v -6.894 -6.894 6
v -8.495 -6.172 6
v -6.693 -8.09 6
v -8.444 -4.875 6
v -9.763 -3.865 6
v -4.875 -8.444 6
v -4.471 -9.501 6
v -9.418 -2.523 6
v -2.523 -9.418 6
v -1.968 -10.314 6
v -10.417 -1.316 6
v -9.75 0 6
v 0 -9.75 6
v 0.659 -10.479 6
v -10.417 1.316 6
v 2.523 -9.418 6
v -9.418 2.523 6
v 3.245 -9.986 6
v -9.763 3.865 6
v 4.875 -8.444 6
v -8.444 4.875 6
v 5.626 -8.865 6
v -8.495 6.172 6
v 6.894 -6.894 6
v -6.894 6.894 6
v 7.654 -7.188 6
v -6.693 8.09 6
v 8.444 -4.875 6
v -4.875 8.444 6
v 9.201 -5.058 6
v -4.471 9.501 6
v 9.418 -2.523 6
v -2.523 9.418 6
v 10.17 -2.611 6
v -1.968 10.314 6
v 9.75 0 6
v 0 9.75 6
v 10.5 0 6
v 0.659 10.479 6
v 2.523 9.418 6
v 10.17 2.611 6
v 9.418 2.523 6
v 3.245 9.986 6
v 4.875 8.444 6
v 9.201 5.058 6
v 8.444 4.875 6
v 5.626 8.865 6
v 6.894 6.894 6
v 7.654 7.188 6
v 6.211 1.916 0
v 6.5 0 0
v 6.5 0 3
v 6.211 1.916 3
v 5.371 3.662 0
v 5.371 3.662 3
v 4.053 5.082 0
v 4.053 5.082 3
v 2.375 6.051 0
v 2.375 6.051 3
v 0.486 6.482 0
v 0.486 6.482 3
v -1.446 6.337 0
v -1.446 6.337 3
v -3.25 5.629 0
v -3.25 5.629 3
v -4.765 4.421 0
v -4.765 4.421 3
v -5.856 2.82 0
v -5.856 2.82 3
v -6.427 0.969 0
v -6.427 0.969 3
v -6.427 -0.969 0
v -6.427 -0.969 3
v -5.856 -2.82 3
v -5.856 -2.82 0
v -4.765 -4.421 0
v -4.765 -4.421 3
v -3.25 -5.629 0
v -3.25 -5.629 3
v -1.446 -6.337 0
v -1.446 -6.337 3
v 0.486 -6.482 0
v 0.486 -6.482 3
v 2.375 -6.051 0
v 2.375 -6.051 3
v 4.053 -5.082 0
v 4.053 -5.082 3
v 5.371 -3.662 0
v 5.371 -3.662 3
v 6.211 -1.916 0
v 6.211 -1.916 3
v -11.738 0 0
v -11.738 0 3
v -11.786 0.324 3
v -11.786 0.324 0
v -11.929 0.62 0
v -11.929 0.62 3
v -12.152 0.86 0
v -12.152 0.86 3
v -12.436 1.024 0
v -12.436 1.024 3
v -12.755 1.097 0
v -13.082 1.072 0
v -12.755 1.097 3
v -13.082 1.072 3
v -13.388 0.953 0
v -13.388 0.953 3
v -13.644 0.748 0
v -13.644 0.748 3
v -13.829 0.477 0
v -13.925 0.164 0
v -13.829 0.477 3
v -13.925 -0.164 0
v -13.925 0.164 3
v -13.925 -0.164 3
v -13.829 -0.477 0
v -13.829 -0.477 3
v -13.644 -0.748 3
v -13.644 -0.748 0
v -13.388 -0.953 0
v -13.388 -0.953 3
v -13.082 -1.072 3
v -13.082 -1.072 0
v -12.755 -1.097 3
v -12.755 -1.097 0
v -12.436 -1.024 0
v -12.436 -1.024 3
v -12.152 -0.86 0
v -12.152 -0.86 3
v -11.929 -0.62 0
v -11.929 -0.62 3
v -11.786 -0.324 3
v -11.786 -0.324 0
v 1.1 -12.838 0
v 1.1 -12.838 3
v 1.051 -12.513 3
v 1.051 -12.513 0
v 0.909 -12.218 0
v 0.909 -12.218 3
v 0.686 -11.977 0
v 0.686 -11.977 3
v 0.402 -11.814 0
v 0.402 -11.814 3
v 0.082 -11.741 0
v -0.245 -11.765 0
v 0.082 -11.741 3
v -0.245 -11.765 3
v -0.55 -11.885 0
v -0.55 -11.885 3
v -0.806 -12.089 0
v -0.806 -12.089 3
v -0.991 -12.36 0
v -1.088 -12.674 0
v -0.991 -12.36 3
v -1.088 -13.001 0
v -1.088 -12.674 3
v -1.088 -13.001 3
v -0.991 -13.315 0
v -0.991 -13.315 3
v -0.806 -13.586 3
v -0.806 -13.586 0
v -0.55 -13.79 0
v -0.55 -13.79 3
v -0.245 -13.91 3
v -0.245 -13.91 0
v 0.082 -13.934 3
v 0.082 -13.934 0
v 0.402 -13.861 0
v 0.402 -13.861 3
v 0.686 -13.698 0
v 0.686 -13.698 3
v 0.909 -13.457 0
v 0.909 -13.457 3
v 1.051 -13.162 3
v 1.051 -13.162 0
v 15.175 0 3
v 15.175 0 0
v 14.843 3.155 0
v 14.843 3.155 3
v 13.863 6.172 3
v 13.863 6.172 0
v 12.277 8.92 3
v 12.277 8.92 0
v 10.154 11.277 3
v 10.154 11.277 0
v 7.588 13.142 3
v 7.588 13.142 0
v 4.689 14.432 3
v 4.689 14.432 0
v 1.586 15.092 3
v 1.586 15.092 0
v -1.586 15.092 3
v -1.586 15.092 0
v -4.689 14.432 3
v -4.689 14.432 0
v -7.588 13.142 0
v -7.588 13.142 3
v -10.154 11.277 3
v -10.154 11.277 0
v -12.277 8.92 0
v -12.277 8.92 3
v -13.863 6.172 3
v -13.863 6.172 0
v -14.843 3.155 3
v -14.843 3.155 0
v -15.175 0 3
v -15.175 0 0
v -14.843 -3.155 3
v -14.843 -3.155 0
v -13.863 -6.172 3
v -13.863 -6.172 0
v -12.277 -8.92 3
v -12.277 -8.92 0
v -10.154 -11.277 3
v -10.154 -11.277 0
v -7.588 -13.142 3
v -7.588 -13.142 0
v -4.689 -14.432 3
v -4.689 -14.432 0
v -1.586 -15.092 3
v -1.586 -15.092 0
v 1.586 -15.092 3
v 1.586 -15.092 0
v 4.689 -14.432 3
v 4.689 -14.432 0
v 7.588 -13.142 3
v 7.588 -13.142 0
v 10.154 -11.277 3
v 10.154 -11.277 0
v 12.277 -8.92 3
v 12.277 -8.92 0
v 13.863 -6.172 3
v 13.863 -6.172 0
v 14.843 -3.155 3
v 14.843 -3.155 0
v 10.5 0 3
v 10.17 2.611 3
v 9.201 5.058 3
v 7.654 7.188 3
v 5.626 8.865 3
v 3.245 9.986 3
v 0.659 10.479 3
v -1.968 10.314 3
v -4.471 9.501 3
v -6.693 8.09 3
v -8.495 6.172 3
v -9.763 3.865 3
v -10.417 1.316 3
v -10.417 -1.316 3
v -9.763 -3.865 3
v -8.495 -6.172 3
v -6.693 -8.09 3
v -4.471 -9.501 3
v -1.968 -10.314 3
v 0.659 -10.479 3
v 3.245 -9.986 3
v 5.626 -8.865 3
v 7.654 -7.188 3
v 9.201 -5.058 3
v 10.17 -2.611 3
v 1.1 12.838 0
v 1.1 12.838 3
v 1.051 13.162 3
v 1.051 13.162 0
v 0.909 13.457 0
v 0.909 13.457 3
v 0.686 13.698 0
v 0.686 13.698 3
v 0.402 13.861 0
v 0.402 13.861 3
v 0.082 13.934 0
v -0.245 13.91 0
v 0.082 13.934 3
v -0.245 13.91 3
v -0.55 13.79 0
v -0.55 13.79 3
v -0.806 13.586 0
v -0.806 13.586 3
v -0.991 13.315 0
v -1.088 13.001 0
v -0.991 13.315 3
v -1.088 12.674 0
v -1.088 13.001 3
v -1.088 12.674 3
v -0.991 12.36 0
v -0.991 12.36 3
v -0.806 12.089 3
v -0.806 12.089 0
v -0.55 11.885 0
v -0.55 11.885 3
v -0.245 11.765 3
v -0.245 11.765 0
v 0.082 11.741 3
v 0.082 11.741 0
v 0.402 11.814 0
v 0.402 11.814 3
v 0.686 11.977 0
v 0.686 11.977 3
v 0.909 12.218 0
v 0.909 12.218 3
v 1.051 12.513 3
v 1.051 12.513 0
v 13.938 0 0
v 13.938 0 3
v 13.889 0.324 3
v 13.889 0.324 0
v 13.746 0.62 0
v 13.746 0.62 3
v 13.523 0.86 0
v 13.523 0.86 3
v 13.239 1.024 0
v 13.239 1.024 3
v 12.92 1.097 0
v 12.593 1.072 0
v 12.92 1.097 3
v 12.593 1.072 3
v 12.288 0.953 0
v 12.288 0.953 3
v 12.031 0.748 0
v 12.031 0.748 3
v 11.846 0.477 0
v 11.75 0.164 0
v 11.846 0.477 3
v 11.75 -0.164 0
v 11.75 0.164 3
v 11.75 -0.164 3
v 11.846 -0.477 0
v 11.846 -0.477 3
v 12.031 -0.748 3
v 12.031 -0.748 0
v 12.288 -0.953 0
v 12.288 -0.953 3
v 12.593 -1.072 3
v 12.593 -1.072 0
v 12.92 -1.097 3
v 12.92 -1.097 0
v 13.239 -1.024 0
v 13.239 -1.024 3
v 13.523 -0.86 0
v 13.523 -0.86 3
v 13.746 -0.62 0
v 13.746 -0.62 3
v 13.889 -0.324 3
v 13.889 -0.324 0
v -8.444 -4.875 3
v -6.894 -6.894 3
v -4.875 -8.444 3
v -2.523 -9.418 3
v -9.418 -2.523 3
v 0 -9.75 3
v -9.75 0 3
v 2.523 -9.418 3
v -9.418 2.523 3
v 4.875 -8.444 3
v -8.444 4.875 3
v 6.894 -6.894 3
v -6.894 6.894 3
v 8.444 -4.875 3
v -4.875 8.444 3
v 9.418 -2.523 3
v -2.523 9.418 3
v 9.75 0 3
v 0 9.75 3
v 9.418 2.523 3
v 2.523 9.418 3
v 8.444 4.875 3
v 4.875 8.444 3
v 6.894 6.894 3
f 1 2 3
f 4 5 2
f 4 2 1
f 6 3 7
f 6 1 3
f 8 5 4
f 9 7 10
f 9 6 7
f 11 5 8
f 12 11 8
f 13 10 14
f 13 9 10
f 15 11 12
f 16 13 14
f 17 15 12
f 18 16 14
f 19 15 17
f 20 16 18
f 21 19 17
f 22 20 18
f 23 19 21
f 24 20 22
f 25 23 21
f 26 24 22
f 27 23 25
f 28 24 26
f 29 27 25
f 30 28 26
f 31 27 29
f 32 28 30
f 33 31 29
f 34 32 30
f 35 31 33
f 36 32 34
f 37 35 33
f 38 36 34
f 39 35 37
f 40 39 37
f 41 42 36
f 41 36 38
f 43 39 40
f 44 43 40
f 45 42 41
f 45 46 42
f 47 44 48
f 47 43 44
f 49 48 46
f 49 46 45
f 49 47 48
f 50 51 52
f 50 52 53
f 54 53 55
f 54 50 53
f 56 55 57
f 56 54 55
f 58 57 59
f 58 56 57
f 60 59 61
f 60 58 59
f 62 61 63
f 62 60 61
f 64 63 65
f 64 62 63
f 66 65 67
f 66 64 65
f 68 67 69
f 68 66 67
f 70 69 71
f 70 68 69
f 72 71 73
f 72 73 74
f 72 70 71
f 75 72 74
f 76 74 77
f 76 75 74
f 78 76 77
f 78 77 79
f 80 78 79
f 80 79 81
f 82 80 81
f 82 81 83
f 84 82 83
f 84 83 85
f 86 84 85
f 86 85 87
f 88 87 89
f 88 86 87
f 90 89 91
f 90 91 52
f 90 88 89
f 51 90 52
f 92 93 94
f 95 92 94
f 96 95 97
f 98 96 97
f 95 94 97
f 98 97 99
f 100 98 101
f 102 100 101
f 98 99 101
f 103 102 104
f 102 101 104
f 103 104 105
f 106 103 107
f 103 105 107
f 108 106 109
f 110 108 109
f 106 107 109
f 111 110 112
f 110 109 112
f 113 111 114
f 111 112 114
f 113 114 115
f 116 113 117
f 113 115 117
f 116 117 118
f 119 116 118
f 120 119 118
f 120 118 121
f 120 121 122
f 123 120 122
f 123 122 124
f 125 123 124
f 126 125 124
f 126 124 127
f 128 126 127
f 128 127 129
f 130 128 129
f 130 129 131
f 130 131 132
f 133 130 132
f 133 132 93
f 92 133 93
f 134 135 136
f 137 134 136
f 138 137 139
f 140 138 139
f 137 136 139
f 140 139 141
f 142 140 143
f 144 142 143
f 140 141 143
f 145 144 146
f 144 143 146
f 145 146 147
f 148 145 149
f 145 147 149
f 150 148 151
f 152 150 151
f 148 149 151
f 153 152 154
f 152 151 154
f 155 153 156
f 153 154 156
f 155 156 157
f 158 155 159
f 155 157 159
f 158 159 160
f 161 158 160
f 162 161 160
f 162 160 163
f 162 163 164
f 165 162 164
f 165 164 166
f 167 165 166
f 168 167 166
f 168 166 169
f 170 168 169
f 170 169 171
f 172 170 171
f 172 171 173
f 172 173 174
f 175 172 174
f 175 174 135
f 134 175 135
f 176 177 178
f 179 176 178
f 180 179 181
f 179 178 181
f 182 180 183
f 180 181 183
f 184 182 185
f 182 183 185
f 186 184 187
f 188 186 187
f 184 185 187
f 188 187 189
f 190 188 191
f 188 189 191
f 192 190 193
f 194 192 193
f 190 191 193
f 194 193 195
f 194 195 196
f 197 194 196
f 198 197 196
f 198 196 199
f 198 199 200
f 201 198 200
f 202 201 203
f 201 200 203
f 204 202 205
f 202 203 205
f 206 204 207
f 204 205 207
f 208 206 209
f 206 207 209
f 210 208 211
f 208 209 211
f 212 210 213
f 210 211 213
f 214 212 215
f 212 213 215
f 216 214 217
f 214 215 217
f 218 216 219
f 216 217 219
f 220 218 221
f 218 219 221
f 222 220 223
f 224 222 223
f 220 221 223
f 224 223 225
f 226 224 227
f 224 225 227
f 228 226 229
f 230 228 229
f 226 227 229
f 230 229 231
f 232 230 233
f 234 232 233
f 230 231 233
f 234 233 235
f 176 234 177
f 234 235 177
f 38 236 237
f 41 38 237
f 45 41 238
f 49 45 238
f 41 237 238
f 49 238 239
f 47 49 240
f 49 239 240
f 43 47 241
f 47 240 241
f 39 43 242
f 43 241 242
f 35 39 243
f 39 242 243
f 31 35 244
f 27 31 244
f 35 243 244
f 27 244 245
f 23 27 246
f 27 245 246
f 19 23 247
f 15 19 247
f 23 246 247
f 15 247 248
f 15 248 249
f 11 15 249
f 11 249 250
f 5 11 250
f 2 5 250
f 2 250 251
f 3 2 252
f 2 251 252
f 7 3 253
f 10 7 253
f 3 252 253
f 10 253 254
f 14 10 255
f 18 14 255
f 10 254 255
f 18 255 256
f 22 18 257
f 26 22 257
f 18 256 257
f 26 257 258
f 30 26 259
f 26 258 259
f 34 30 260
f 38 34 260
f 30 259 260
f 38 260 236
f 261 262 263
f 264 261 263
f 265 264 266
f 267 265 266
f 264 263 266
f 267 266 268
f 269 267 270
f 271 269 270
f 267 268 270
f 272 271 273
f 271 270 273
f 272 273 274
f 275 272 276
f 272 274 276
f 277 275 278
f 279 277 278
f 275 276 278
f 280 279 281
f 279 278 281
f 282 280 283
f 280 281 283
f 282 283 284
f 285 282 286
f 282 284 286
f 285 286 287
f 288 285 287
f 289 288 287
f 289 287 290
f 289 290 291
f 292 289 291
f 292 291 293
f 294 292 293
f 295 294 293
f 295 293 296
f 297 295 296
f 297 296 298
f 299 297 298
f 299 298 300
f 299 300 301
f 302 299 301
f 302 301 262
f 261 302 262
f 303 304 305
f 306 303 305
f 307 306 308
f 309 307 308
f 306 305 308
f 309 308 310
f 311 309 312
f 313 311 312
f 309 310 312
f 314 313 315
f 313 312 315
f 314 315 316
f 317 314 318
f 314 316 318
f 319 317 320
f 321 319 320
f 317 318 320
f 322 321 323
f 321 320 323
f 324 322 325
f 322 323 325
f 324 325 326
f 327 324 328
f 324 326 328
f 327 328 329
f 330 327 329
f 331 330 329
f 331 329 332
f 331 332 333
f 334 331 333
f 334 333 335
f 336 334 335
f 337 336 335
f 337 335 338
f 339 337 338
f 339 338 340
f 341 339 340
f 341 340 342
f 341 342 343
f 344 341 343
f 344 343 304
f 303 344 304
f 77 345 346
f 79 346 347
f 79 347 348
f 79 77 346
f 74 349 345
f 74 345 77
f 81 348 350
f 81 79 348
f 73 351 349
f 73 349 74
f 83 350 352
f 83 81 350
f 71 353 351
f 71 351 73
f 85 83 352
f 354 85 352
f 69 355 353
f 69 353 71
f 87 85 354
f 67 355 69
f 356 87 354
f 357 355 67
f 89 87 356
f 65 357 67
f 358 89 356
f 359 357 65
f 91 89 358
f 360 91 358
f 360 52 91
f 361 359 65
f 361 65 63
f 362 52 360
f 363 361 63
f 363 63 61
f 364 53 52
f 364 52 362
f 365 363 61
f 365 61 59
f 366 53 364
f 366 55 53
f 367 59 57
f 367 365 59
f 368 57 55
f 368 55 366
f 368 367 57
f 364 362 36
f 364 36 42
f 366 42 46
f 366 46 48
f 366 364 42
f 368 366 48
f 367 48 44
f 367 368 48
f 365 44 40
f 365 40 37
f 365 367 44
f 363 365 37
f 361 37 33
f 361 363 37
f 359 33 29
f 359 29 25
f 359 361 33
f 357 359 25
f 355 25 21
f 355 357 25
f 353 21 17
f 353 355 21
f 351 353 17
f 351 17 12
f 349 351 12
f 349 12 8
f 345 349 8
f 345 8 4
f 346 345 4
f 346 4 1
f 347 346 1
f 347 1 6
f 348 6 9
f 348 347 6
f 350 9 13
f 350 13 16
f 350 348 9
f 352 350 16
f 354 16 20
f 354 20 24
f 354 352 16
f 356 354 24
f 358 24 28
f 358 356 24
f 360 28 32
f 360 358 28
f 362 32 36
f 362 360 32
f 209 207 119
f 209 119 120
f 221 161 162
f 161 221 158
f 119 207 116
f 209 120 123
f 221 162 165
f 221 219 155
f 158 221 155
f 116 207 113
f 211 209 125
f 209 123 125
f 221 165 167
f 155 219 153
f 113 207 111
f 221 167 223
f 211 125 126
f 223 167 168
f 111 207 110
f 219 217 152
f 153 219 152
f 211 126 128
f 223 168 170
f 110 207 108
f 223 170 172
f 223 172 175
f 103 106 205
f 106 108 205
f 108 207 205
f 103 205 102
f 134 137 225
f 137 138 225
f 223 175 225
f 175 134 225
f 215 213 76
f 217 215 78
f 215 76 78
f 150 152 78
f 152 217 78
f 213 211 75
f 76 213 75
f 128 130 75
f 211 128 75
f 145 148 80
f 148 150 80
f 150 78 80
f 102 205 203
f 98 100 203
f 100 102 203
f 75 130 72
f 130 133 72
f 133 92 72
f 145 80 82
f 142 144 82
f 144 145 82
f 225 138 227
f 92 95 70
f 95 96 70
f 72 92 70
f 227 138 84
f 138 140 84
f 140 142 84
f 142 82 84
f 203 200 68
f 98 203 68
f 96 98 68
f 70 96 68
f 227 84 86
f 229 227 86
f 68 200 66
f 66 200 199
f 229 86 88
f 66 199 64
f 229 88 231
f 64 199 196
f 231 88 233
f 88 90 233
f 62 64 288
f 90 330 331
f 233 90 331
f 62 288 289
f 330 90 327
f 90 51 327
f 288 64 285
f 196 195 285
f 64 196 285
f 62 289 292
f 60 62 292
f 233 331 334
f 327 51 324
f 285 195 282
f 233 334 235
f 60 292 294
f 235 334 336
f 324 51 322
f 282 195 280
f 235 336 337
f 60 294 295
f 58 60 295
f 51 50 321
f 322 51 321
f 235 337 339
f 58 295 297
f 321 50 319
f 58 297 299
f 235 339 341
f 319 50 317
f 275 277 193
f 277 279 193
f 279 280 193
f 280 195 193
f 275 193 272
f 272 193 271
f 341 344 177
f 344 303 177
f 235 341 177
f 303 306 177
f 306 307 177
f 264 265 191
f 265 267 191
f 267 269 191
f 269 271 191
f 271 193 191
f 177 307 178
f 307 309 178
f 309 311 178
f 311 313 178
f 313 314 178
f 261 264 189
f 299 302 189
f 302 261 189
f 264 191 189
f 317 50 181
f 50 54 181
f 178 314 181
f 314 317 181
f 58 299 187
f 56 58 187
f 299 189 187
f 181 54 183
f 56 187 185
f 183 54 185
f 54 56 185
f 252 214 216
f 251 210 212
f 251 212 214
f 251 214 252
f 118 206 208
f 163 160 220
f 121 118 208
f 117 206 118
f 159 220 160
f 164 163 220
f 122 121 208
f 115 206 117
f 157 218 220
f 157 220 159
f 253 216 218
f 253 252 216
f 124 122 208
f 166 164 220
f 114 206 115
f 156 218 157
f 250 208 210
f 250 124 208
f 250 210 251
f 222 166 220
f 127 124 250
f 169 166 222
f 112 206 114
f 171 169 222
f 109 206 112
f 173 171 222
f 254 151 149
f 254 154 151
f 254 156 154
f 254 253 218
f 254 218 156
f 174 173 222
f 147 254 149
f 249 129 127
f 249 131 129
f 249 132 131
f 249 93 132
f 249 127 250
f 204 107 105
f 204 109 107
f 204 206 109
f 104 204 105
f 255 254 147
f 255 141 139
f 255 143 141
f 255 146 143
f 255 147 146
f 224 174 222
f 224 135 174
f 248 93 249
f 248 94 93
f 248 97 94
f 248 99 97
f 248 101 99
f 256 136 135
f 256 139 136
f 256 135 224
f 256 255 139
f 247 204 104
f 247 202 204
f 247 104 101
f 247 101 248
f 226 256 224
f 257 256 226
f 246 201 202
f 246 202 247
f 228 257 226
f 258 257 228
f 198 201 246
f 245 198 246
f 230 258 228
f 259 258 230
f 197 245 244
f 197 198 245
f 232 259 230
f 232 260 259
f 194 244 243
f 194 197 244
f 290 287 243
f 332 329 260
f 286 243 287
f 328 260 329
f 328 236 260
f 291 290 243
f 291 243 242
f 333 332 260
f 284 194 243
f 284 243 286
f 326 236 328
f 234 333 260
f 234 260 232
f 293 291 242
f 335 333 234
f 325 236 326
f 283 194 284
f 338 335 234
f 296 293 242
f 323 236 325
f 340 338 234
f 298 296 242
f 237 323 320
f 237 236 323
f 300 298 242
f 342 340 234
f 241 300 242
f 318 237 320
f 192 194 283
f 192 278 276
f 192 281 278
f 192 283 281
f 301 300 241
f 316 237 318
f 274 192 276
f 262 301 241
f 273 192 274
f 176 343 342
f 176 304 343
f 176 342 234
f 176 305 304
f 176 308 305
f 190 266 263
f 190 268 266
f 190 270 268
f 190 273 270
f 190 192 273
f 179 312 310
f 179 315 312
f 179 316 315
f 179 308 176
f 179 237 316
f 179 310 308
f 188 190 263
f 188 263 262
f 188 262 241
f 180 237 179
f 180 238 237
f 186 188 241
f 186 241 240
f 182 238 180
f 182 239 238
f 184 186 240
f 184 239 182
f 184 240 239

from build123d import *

# Parameters (mm, degrees)
SKETCH1_R                = 15.175
SKETCH1_R_2              = 6.5
BOSS_EXTRUDE1_DEPTH      = 3
SKETCH2_R                = 10.5
SKETCH2_R_2              = 9.75
BOSS_EXTRUDE2_DEPTH      = 3
M2_CLEARANCE_HOLE1_D     = 2.2
M2_CLEARANCE_HOLE1_DEPTH = 10
M2_CLEARANCE_HOLE1_TIP   = 0.660946681


with BuildPart() as part:
    # Sketch1 → Boss-Extrude1 (new body)
    with BuildSketch(Plane.XY):
        Circle(SKETCH1_R)
        Circle(SKETCH1_R_2, mode=Mode.SUBTRACT)
    extrude(amount=BOSS_EXTRUDE1_DEPTH)

    # Sketch2 → Boss-Extrude2 (add)
    with BuildSketch(Plane.XY.offset(3)):
        Circle(SKETCH2_R)
        Circle(SKETCH2_R_2, mode=Mode.SUBTRACT)
    extrude(amount=BOSS_EXTRUDE2_DEPTH)

    # M2 Clearance Hole1
    with Locations(Plane(origin=(0, 0, 0), x_dir=(-1, 0, 0), z_dir=(0, 0, -1))):
        with Locations((0, 12.8375), (12.8375, 0), (0, -12.8375), (-12.8375, 0)):
            Hole(M2_CLEARANCE_HOLE1_D / 2, depth=M2_CLEARANCE_HOLE1_DEPTH)
            with Locations((0, 0, -(M2_CLEARANCE_HOLE1_DEPTH + M2_CLEARANCE_HOLE1_TIP / 2))):  # 118° drill point
                Cone(0, M2_CLEARANCE_HOLE1_D / 2, M2_CLEARANCE_HOLE1_TIP, mode=Mode.SUBTRACT)


solid = part.part
